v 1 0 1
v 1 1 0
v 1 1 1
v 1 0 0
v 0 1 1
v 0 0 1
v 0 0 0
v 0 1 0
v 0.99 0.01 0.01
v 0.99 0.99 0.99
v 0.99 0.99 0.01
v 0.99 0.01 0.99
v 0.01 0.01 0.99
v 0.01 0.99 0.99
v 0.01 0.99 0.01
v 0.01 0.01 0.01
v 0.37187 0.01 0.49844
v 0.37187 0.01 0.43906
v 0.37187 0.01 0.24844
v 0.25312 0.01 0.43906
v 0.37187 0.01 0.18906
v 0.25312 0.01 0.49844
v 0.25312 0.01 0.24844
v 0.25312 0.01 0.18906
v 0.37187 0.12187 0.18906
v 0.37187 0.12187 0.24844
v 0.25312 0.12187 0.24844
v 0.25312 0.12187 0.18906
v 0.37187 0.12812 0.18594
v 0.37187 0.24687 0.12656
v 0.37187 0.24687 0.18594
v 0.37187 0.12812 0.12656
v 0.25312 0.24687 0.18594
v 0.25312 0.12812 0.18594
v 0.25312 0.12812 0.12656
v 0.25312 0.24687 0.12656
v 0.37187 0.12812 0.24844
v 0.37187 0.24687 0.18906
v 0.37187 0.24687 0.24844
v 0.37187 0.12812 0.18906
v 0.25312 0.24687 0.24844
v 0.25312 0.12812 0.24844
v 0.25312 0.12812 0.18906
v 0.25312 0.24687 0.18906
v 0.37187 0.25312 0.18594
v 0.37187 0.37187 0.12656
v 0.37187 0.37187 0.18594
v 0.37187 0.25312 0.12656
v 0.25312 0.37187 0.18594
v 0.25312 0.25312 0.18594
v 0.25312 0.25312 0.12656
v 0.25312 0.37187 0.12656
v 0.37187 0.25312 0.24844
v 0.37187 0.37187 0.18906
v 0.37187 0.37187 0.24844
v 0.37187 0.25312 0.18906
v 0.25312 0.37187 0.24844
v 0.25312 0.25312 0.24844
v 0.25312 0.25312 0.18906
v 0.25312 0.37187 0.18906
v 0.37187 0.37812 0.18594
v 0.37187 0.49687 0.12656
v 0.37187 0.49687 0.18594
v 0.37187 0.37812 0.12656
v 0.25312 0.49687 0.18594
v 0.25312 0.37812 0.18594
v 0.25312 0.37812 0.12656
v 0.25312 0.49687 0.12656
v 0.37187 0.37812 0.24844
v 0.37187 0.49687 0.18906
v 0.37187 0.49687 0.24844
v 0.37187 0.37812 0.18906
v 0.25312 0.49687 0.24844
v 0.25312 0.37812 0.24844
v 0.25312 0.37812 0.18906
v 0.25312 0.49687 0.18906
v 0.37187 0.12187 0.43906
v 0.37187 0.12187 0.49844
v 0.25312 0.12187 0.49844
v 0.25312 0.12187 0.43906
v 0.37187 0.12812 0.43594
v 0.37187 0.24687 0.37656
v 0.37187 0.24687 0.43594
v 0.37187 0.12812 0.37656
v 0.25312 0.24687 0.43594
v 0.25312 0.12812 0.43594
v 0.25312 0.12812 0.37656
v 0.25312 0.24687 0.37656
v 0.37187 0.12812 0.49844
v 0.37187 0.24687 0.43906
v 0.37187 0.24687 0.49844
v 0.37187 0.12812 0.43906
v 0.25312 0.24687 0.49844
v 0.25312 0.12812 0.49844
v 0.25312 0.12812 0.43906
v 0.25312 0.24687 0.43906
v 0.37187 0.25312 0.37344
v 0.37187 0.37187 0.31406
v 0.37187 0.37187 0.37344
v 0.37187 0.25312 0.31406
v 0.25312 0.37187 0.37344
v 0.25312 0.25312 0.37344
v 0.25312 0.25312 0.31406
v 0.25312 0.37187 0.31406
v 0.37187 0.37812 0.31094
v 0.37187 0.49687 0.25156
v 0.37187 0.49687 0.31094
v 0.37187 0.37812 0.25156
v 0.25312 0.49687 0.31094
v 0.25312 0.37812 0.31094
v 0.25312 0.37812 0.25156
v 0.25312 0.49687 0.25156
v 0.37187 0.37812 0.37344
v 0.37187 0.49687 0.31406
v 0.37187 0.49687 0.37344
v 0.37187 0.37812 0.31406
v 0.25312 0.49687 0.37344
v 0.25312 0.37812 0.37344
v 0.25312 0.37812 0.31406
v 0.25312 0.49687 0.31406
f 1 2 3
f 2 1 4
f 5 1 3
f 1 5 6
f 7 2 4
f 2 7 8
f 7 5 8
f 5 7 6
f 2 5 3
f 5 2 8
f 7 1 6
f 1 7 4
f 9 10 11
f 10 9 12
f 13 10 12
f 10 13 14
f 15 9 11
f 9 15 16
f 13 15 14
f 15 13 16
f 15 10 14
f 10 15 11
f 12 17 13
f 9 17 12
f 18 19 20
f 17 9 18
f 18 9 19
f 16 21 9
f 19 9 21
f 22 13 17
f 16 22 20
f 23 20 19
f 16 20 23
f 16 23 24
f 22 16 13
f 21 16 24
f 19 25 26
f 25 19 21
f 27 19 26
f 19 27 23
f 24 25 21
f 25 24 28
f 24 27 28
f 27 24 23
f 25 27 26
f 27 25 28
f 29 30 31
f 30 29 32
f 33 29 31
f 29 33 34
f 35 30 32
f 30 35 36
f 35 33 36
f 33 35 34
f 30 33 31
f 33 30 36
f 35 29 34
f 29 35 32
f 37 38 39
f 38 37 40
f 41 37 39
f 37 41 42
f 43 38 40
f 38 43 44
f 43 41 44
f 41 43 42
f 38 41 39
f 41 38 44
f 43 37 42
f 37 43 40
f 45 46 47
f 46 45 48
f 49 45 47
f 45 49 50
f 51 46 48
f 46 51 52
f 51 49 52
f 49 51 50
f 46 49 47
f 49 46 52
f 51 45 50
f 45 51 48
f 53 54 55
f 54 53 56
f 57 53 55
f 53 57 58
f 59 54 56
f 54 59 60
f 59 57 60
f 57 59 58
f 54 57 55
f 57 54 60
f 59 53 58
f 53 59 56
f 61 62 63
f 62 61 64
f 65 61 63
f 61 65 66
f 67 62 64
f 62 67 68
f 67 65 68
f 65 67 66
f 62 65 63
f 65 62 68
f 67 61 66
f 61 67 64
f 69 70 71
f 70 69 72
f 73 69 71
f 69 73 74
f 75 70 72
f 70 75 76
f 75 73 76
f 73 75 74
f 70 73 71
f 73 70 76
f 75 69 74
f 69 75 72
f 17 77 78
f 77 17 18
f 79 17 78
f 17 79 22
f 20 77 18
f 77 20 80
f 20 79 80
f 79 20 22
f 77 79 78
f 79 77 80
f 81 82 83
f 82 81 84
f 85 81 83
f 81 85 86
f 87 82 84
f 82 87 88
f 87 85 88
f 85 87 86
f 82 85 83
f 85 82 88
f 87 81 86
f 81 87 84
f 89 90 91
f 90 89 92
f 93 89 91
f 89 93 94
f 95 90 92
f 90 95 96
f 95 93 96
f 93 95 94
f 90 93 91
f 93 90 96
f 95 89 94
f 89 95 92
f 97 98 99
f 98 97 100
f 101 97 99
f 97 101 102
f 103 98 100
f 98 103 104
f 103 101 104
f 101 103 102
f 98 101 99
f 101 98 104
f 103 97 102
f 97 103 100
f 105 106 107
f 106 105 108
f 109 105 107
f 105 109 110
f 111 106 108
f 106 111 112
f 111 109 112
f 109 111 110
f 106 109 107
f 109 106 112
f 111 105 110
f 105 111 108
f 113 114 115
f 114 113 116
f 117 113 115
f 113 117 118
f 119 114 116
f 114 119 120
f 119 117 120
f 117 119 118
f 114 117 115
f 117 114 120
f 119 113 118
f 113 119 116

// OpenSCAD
translate([0.3125, 0.0625, 0.21875]) color([0.5007484231317689, 0.23725843071495933, 0.7435751616565288]) cube([0.11875, 0.11875, 0.059375], center=true);
translate([0.3125, 0.1875, 0.15625]) color([0.030326511183225713, 0.9534383365251057, 0.44454391677925087]) cube([0.11875, 0.11875, 0.059375], center=true);
translate([0.3125, 0.1875, 0.21875]) color([0.4017260225039573, 0.6984802625757133, 0.14751428227125585]) cube([0.11875, 0.11875, 0.059375], center=true);
translate([0.3125, 0.3125, 0.15625]) color([0.592053202978914, 0.7602792343344718, 0.23214841748979886]) cube([0.11875, 0.11875, 0.059375], center=true);
translate([0.3125, 0.3125, 0.21875]) color([0.2215781656479593, 0.24536616409996503, 0.7021925659500807]) cube([0.11875, 0.11875, 0.059375], center=true);
translate([0.3125, 0.4375, 0.15625]) color([0.5457605096294114, 0.54011508338913, 0.5459453680001618]) cube([0.11875, 0.11875, 0.059375], center=true);
translate([0.3125, 0.4375, 0.21875]) color([0.21439919344985514, 0.4167057873106884, 0.6193494045718565]) cube([0.11875, 0.11875, 0.059375], center=true);
translate([0.3125, 0.0625, 0.46875]) color([0.45760594266221877, 0.8933837090972113, 0.8109172526149769]) cube([0.11875, 0.11875, 0.059375], center=true);
translate([0.3125, 0.1875, 0.40625]) color([0.14833972802097417, 0.6068004170768148, 0.5080529466064481]) cube([0.11875, 0.11875, 0.059375], center=true);
translate([0.3125, 0.1875, 0.46875]) color([0.9906187087676633, 0.11352393843166497, 0.6883720652754897]) cube([0.11875, 0.11875, 0.059375], center=true);
translate([0.3125, 0.3125, 0.34375]) color([0.5952346609945763, 0.6540807806784664, 0.3474259839548979]) cube([0.11875, 0.11875, 0.059375], center=true);
translate([0.3125, 0.4375, 0.28125]) color([0.9928586924360654, 0.247192741454632, 0.70975753974483]) cube([0.11875, 0.11875, 0.059375], center=true);
translate([0.3125, 0.4375, 0.34375]) color([0.13794757021236903, 0.4611444179186315, 0.04899626755467579]) cube([0.11875, 0.11875, 0.059375], center=true);
color([0.3,0.3,0.3,0.3]) difference() { cube([1,1,1]); translate([0.01,0.01,0.01]) cube([0.98,0.98,0.98]); }
